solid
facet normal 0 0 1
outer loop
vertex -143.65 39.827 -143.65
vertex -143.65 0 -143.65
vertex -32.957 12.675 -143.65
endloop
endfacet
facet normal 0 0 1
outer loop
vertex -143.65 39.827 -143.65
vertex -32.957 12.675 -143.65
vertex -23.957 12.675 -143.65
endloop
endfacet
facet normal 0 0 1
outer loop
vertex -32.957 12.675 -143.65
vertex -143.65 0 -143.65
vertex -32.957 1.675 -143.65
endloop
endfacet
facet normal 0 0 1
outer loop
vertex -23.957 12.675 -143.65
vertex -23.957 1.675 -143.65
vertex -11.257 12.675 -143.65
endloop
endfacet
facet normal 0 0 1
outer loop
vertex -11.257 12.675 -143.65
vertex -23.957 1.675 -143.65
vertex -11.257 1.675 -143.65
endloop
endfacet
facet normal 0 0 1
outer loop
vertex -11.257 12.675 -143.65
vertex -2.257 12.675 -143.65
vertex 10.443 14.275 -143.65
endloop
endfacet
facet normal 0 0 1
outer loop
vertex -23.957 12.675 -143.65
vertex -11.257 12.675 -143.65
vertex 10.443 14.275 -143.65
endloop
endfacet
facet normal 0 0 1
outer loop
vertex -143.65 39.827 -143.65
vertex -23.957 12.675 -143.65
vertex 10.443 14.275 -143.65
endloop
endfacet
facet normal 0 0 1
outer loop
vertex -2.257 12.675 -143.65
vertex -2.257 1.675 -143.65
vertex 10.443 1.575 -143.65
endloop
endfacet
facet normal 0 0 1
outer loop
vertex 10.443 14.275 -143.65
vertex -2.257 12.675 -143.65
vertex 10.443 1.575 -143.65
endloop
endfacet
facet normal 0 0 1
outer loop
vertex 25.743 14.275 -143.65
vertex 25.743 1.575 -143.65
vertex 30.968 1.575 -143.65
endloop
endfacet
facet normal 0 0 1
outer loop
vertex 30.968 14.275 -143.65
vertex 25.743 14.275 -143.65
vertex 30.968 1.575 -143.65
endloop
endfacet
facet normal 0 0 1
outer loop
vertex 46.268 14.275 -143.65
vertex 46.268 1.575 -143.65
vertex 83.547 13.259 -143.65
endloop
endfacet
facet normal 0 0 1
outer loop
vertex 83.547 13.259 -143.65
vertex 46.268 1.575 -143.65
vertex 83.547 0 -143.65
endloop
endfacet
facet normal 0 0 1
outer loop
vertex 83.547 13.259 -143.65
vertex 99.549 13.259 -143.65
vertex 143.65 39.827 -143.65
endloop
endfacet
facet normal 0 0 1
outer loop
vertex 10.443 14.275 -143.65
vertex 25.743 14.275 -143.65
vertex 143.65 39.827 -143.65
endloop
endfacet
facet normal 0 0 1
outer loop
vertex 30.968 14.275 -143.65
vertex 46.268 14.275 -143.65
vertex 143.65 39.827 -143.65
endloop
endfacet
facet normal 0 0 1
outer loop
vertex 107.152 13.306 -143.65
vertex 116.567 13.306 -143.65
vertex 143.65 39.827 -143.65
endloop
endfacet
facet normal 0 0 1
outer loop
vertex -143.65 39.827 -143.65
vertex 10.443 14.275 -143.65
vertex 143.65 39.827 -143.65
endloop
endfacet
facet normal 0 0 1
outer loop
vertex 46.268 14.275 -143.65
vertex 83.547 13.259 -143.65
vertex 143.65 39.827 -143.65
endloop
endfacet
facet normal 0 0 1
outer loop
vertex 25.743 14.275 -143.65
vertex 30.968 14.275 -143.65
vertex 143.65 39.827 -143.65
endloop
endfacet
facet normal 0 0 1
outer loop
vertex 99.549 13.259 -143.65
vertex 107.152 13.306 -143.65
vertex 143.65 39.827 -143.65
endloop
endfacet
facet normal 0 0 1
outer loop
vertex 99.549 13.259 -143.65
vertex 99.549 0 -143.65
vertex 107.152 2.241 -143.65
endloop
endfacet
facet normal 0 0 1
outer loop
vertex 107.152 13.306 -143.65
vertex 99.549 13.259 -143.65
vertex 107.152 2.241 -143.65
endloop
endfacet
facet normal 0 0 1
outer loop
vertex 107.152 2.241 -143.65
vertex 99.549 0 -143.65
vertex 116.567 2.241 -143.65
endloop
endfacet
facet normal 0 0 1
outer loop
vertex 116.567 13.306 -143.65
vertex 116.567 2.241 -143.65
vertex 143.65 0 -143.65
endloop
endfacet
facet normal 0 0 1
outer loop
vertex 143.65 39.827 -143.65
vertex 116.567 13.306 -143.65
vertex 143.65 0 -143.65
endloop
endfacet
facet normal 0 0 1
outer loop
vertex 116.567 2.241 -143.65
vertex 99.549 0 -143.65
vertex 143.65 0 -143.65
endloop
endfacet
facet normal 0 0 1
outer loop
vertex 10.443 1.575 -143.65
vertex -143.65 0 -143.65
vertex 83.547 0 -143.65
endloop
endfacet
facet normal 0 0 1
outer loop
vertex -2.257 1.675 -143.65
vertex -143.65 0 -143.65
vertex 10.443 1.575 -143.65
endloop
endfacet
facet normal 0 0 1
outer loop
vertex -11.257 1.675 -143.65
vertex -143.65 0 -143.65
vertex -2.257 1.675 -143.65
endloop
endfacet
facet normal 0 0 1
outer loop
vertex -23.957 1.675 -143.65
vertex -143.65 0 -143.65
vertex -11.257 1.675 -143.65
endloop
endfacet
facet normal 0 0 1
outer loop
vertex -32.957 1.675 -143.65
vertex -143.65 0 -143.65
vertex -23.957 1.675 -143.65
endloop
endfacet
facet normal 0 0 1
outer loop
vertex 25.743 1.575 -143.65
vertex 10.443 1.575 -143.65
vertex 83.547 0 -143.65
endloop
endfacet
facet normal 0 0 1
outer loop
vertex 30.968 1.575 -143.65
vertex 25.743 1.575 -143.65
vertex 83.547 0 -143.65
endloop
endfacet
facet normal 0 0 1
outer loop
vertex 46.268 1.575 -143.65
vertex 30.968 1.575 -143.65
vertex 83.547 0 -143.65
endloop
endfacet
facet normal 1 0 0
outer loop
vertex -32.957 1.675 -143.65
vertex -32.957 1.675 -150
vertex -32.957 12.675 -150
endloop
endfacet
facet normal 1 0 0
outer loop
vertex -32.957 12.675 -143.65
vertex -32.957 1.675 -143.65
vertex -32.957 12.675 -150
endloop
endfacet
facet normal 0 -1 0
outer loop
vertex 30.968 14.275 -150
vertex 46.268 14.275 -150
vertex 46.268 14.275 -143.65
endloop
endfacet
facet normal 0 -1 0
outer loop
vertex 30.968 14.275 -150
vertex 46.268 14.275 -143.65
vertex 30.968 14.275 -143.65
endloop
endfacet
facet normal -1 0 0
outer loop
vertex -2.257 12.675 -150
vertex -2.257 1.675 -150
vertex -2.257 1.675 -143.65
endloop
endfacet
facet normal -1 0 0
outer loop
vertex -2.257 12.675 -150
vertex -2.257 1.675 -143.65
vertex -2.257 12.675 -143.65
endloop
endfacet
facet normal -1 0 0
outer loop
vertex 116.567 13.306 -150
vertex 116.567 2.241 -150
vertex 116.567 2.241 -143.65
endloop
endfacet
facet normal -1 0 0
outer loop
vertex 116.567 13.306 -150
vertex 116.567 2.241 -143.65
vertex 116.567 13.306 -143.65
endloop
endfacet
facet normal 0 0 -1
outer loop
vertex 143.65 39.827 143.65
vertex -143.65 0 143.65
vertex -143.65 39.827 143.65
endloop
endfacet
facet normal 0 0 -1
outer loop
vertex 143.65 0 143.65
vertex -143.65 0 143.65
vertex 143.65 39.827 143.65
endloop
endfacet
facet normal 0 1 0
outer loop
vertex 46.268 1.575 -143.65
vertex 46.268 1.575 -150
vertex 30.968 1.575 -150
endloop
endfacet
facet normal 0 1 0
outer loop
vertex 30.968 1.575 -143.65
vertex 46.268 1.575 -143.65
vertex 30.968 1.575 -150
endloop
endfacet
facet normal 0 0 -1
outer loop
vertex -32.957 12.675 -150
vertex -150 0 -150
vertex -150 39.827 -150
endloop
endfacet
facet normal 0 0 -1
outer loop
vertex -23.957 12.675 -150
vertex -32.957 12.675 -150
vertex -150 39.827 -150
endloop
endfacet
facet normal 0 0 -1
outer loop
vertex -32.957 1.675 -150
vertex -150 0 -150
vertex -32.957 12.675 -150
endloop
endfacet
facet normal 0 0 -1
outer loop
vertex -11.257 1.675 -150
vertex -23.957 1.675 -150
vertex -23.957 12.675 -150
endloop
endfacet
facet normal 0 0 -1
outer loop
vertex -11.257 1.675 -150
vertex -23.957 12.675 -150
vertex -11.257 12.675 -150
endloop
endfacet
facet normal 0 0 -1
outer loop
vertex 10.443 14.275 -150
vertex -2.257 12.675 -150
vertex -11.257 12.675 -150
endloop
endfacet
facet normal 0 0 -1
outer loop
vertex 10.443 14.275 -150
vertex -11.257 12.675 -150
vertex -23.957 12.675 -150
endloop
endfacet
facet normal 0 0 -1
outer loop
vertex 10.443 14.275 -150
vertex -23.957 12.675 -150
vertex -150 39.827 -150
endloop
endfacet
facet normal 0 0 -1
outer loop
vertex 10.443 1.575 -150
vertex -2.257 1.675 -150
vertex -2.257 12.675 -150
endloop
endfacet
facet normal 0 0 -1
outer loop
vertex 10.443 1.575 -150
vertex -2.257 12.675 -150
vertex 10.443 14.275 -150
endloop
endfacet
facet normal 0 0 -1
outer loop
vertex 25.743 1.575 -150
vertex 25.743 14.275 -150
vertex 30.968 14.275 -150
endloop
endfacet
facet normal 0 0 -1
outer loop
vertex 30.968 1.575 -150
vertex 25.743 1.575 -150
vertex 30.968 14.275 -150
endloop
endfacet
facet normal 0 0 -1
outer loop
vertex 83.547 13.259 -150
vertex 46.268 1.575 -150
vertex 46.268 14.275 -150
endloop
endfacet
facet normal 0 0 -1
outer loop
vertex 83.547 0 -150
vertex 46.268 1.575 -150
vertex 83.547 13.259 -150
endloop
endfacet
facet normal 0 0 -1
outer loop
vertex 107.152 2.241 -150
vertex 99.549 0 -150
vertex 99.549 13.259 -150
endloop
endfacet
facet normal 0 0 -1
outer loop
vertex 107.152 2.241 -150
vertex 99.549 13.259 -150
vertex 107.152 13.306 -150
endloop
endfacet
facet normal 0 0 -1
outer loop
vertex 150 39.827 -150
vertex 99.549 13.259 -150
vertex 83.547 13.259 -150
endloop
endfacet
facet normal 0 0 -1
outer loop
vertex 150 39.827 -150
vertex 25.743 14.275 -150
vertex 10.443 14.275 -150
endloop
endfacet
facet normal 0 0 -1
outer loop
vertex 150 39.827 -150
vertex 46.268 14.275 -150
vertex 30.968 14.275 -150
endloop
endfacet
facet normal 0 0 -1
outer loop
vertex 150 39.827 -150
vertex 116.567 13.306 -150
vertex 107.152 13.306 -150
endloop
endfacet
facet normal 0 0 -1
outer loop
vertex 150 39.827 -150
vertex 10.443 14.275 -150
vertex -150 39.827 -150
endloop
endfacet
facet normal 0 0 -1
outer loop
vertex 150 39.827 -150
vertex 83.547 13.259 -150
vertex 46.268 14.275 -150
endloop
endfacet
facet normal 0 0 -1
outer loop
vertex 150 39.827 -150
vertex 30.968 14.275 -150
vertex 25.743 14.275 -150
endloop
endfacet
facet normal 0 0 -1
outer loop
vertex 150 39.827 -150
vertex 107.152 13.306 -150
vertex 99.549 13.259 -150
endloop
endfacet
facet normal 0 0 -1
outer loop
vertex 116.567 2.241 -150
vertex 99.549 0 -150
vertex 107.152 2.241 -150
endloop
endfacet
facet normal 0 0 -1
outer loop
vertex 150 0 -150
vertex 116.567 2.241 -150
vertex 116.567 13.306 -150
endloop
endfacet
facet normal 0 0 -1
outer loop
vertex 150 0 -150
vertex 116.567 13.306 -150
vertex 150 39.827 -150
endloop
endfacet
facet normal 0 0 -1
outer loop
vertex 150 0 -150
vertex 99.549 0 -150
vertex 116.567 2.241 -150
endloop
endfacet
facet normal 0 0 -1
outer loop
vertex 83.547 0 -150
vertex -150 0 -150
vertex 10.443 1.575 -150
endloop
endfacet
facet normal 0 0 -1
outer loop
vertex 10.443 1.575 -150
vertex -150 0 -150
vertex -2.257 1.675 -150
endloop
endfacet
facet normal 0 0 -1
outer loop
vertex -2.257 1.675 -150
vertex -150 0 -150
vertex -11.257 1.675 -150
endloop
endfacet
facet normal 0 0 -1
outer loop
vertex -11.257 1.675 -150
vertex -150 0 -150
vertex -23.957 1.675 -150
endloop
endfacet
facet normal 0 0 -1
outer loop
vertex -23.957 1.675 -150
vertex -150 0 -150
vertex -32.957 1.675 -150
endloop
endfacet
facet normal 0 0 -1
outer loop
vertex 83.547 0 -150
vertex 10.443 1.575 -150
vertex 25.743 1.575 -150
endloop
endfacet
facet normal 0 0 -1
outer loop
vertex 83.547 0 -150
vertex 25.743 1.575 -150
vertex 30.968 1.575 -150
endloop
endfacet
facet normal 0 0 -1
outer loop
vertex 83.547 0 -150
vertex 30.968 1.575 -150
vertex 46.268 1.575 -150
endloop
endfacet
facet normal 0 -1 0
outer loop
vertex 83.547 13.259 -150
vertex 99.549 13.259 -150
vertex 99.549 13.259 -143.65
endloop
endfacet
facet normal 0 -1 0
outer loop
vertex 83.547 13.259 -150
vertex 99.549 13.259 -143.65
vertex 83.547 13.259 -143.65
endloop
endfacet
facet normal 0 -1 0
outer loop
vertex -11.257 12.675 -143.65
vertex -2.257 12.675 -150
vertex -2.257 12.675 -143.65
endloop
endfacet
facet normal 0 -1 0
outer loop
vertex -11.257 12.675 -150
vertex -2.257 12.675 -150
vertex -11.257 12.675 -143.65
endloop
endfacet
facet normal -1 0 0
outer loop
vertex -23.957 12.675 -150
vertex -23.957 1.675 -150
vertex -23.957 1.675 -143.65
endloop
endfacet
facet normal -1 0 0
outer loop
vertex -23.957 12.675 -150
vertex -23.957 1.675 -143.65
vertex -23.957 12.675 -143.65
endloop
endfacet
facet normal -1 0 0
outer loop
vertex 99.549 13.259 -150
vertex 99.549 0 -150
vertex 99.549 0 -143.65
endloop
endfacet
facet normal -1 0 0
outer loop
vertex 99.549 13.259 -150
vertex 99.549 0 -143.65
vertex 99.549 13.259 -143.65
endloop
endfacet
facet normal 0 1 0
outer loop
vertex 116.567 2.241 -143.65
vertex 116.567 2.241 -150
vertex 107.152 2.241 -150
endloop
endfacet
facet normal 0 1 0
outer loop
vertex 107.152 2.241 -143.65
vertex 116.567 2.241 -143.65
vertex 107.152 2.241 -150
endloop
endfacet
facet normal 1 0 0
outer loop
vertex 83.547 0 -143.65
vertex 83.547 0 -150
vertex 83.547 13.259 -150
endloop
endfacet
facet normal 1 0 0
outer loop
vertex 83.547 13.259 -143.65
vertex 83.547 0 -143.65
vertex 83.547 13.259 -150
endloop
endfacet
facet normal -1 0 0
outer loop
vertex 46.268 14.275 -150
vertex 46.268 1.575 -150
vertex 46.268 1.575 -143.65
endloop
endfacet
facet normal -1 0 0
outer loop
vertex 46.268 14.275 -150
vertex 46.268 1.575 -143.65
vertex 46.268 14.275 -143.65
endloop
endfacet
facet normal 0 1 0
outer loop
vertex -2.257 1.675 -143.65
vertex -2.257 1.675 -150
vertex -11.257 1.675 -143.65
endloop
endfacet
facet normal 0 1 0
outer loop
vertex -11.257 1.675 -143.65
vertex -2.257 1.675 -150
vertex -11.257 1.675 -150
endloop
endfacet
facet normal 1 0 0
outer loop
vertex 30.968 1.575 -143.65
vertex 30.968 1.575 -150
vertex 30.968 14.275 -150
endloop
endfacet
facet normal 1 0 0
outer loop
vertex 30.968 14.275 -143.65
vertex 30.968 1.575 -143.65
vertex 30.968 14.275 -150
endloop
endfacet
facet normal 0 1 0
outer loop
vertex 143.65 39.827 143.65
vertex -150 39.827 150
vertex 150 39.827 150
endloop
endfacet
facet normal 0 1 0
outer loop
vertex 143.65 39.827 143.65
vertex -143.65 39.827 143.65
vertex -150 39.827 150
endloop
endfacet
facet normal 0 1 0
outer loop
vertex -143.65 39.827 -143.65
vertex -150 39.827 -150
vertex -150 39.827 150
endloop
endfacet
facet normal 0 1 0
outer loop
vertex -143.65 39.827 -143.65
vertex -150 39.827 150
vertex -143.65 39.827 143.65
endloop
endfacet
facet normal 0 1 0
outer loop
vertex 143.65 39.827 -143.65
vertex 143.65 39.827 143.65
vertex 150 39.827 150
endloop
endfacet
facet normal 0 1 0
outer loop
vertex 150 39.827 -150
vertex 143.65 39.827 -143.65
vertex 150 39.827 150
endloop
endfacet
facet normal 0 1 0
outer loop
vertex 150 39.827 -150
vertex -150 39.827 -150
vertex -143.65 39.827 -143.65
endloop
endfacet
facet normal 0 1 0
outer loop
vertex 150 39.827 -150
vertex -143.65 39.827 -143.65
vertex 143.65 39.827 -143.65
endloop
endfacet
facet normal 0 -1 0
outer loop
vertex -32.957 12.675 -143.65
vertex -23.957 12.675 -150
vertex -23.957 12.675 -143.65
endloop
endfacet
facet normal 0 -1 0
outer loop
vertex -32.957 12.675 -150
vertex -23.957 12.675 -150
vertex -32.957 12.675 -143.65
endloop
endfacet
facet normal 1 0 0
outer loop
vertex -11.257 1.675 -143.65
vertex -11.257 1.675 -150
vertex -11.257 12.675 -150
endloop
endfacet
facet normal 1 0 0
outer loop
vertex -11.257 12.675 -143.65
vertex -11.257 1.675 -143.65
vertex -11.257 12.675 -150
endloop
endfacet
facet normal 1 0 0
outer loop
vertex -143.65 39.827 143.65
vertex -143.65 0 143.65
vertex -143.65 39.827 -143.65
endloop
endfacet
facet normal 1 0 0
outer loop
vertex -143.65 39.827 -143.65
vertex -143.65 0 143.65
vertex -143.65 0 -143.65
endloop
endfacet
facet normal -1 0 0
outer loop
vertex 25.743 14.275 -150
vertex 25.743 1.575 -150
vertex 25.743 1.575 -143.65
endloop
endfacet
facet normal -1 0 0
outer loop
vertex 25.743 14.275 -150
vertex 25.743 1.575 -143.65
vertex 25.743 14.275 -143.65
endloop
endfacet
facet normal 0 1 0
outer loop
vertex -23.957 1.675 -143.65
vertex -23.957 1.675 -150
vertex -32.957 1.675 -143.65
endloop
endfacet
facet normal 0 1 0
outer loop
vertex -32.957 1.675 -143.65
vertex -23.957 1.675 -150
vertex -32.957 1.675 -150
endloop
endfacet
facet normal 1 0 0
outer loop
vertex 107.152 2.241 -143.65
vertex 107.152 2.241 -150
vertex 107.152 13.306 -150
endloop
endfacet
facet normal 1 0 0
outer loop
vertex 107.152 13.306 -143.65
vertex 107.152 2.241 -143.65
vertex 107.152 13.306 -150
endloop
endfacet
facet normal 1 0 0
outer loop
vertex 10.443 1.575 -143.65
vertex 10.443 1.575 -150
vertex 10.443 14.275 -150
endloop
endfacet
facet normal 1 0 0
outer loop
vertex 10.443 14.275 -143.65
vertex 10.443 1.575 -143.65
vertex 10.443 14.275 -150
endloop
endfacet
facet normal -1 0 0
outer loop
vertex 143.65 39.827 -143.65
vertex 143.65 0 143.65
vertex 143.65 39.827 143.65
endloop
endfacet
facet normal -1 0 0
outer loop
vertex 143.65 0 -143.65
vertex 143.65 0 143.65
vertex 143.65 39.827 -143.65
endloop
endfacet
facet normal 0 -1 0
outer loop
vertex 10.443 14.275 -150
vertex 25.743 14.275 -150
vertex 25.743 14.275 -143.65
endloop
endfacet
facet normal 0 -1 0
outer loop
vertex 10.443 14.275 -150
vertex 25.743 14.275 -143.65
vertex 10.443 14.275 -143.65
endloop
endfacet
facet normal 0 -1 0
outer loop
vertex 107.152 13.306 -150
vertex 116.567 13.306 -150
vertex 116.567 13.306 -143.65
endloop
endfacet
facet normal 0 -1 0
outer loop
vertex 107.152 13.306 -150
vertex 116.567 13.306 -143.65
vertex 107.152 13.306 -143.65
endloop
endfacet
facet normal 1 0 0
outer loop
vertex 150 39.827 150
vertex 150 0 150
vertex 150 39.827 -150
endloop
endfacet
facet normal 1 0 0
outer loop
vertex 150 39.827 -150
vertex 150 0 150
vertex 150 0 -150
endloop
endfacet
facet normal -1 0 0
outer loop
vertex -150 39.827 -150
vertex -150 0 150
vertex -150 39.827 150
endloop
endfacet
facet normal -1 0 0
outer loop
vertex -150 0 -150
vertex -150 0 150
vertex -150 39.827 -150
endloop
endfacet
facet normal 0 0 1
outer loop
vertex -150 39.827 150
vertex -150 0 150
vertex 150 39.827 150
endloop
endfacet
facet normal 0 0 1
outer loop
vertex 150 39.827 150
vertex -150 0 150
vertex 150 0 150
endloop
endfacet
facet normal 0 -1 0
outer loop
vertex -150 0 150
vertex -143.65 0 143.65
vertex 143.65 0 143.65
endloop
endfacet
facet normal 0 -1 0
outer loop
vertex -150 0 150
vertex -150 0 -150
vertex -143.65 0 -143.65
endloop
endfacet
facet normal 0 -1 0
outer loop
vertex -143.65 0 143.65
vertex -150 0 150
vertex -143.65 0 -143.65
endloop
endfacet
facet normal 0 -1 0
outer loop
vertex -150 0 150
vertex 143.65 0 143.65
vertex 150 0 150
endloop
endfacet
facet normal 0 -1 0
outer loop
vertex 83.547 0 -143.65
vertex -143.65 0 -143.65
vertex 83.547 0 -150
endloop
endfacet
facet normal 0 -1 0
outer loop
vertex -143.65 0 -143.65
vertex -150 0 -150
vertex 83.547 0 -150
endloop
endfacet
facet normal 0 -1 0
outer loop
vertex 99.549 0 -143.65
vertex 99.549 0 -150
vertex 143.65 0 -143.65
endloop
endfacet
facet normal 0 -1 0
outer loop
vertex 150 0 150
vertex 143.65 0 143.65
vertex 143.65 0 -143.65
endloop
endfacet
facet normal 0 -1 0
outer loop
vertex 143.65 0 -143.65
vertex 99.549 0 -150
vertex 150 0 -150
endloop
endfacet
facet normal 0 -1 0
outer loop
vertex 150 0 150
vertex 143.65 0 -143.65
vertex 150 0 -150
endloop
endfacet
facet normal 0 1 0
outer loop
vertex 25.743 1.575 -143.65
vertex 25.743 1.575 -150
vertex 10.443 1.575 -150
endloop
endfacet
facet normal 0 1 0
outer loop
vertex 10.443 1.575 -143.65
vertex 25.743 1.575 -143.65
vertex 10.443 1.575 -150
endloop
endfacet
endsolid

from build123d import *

# Parameters (mm, degrees)
SKETCH1_W           = 300
SKETCH1_H           = 300
SKETCH1_W_2         = 287.3
SKETCH1_H_2         = 287.3
BOSS_EXTRUDE1_DEPTH = 39.8272
CUT_EXTRUDE1_REACH  = 339.766
SKETCH3_W           = 9.414604459
SKETCH3_H           = 11.065164
SKETCH3_W_2         = 16.002
SKETCH3_H_2         = 13.335
SKETCH3_W_3         = 15.3
SKETCH3_H_3         = 12.7
SKETCH3_W_4         = 9
SKETCH3_H_4         = 11


with BuildPart() as part:
    # Sketch1 → Boss-Extrude1 (new body)
    with BuildSketch(Plane(origin=(0, 0, 0), x_dir=(1, 0, 0), z_dir=(0, 1, 0))):
        Rectangle(SKETCH1_W, SKETCH1_H)
        Rectangle(SKETCH1_W_2, SKETCH1_H_2, mode=Mode.SUBTRACT)
    extrude(amount=BOSS_EXTRUDE1_DEPTH)

    # Sketch3 → Cut-Extrude1 (cut, up to next)
    with BuildSketch(Plane(origin=(0, 0, -150), x_dir=(-1, 0, 0), z_dir=(0, 0, -1)), mode=Mode.PRIVATE) as cut_extrude1_sk1:
        with Locations((-111.859321897, 7.773371258)):
            Rectangle(SKETCH3_W, SKETCH3_H)
    cut_extrude1_tool1 = extrude(cut_extrude1_sk1.sketch, amount=-CUT_EXTRUDE1_REACH, mode=Mode.PRIVATE) & part.part
    # Sketch3 → Cut-Extrude1 (cut, up to next)
    with BuildSketch(Plane(origin=(0, 0, -150), x_dir=(-1, 0, 0), z_dir=(0, 0, -1)), mode=Mode.PRIVATE) as cut_extrude1_sk2:
        with Locations((-91.547624126, 6.5913)):
            Rectangle(SKETCH3_W_2, SKETCH3_H_2)
    cut_extrude1_tool2 = extrude(cut_extrude1_sk2.sketch, amount=-CUT_EXTRUDE1_REACH, mode=Mode.PRIVATE) & part.part
    # Sketch3 → Cut-Extrude1 (cut, up to next)
    with BuildSketch(Plane(origin=(0, 0, -150), x_dir=(-1, 0, 0), z_dir=(0, 0, -1)), mode=Mode.PRIVATE) as cut_extrude1_sk3:
        with Locations((-38.618448478, 7.9248)):
            Rectangle(SKETCH3_W_3, SKETCH3_H_3)
    cut_extrude1_tool3 = extrude(cut_extrude1_sk3.sketch, amount=-CUT_EXTRUDE1_REACH, mode=Mode.PRIVATE) & part.part
    # Sketch3 → Cut-Extrude1 (cut, up to next)
    with BuildSketch(Plane(origin=(0, 0, -150), x_dir=(-1, 0, 0), z_dir=(0, 0, -1)), mode=Mode.PRIVATE) as cut_extrude1_sk4:
        with Locations((-18.092571078, 7.9248)):
            Rectangle(SKETCH3_W_3, SKETCH3_H_3)
    cut_extrude1_tool4 = extrude(cut_extrude1_sk4.sketch, amount=-CUT_EXTRUDE1_REACH, mode=Mode.PRIVATE) & part.part
    # Sketch3 → Cut-Extrude1 (cut, up to next)
    with BuildSketch(Plane(origin=(0, 0, -150), x_dir=(-1, 0, 0), z_dir=(0, 0, -1)), mode=Mode.PRIVATE) as cut_extrude1_sk5:
        with Locations((6.757428922, 7.1748)):
            Rectangle(SKETCH3_W_4, SKETCH3_H_4)
    cut_extrude1_tool5 = extrude(cut_extrude1_sk5.sketch, amount=-CUT_EXTRUDE1_REACH, mode=Mode.PRIVATE) & part.part
    # Sketch3 → Cut-Extrude1 (cut, up to next)
    with BuildSketch(Plane(origin=(0, 0, -150), x_dir=(-1, 0, 0), z_dir=(0, 0, -1)), mode=Mode.PRIVATE) as cut_extrude1_sk6:
        with Locations((28.457428922, 7.1748)):
            Rectangle(SKETCH3_W_4, SKETCH3_H_4)
    cut_extrude1_tool6 = extrude(cut_extrude1_sk6.sketch, amount=-CUT_EXTRUDE1_REACH, mode=Mode.PRIVATE) & part.part
    add(cut_extrude1_tool1.solids().sort_by_distance((111.859322, 7.773371, -150))[0], mode=Mode.SUBTRACT)
    add(cut_extrude1_tool2.solids().sort_by_distance((91.547624, 6.5913, -150))[0], mode=Mode.SUBTRACT)
    add(cut_extrude1_tool3.solids().sort_by_distance((38.618448, 7.9248, -150))[0], mode=Mode.SUBTRACT)
    add(cut_extrude1_tool4.solids().sort_by_distance((18.092571, 7.9248, -150))[0], mode=Mode.SUBTRACT)
    add(cut_extrude1_tool5.solids().sort_by_distance((-6.757429, 7.1748, -150))[0], mode=Mode.SUBTRACT)
    add(cut_extrude1_tool6.solids().sort_by_distance((-28.457429, 7.1748, -150))[0], mode=Mode.SUBTRACT)


solid = part.part
